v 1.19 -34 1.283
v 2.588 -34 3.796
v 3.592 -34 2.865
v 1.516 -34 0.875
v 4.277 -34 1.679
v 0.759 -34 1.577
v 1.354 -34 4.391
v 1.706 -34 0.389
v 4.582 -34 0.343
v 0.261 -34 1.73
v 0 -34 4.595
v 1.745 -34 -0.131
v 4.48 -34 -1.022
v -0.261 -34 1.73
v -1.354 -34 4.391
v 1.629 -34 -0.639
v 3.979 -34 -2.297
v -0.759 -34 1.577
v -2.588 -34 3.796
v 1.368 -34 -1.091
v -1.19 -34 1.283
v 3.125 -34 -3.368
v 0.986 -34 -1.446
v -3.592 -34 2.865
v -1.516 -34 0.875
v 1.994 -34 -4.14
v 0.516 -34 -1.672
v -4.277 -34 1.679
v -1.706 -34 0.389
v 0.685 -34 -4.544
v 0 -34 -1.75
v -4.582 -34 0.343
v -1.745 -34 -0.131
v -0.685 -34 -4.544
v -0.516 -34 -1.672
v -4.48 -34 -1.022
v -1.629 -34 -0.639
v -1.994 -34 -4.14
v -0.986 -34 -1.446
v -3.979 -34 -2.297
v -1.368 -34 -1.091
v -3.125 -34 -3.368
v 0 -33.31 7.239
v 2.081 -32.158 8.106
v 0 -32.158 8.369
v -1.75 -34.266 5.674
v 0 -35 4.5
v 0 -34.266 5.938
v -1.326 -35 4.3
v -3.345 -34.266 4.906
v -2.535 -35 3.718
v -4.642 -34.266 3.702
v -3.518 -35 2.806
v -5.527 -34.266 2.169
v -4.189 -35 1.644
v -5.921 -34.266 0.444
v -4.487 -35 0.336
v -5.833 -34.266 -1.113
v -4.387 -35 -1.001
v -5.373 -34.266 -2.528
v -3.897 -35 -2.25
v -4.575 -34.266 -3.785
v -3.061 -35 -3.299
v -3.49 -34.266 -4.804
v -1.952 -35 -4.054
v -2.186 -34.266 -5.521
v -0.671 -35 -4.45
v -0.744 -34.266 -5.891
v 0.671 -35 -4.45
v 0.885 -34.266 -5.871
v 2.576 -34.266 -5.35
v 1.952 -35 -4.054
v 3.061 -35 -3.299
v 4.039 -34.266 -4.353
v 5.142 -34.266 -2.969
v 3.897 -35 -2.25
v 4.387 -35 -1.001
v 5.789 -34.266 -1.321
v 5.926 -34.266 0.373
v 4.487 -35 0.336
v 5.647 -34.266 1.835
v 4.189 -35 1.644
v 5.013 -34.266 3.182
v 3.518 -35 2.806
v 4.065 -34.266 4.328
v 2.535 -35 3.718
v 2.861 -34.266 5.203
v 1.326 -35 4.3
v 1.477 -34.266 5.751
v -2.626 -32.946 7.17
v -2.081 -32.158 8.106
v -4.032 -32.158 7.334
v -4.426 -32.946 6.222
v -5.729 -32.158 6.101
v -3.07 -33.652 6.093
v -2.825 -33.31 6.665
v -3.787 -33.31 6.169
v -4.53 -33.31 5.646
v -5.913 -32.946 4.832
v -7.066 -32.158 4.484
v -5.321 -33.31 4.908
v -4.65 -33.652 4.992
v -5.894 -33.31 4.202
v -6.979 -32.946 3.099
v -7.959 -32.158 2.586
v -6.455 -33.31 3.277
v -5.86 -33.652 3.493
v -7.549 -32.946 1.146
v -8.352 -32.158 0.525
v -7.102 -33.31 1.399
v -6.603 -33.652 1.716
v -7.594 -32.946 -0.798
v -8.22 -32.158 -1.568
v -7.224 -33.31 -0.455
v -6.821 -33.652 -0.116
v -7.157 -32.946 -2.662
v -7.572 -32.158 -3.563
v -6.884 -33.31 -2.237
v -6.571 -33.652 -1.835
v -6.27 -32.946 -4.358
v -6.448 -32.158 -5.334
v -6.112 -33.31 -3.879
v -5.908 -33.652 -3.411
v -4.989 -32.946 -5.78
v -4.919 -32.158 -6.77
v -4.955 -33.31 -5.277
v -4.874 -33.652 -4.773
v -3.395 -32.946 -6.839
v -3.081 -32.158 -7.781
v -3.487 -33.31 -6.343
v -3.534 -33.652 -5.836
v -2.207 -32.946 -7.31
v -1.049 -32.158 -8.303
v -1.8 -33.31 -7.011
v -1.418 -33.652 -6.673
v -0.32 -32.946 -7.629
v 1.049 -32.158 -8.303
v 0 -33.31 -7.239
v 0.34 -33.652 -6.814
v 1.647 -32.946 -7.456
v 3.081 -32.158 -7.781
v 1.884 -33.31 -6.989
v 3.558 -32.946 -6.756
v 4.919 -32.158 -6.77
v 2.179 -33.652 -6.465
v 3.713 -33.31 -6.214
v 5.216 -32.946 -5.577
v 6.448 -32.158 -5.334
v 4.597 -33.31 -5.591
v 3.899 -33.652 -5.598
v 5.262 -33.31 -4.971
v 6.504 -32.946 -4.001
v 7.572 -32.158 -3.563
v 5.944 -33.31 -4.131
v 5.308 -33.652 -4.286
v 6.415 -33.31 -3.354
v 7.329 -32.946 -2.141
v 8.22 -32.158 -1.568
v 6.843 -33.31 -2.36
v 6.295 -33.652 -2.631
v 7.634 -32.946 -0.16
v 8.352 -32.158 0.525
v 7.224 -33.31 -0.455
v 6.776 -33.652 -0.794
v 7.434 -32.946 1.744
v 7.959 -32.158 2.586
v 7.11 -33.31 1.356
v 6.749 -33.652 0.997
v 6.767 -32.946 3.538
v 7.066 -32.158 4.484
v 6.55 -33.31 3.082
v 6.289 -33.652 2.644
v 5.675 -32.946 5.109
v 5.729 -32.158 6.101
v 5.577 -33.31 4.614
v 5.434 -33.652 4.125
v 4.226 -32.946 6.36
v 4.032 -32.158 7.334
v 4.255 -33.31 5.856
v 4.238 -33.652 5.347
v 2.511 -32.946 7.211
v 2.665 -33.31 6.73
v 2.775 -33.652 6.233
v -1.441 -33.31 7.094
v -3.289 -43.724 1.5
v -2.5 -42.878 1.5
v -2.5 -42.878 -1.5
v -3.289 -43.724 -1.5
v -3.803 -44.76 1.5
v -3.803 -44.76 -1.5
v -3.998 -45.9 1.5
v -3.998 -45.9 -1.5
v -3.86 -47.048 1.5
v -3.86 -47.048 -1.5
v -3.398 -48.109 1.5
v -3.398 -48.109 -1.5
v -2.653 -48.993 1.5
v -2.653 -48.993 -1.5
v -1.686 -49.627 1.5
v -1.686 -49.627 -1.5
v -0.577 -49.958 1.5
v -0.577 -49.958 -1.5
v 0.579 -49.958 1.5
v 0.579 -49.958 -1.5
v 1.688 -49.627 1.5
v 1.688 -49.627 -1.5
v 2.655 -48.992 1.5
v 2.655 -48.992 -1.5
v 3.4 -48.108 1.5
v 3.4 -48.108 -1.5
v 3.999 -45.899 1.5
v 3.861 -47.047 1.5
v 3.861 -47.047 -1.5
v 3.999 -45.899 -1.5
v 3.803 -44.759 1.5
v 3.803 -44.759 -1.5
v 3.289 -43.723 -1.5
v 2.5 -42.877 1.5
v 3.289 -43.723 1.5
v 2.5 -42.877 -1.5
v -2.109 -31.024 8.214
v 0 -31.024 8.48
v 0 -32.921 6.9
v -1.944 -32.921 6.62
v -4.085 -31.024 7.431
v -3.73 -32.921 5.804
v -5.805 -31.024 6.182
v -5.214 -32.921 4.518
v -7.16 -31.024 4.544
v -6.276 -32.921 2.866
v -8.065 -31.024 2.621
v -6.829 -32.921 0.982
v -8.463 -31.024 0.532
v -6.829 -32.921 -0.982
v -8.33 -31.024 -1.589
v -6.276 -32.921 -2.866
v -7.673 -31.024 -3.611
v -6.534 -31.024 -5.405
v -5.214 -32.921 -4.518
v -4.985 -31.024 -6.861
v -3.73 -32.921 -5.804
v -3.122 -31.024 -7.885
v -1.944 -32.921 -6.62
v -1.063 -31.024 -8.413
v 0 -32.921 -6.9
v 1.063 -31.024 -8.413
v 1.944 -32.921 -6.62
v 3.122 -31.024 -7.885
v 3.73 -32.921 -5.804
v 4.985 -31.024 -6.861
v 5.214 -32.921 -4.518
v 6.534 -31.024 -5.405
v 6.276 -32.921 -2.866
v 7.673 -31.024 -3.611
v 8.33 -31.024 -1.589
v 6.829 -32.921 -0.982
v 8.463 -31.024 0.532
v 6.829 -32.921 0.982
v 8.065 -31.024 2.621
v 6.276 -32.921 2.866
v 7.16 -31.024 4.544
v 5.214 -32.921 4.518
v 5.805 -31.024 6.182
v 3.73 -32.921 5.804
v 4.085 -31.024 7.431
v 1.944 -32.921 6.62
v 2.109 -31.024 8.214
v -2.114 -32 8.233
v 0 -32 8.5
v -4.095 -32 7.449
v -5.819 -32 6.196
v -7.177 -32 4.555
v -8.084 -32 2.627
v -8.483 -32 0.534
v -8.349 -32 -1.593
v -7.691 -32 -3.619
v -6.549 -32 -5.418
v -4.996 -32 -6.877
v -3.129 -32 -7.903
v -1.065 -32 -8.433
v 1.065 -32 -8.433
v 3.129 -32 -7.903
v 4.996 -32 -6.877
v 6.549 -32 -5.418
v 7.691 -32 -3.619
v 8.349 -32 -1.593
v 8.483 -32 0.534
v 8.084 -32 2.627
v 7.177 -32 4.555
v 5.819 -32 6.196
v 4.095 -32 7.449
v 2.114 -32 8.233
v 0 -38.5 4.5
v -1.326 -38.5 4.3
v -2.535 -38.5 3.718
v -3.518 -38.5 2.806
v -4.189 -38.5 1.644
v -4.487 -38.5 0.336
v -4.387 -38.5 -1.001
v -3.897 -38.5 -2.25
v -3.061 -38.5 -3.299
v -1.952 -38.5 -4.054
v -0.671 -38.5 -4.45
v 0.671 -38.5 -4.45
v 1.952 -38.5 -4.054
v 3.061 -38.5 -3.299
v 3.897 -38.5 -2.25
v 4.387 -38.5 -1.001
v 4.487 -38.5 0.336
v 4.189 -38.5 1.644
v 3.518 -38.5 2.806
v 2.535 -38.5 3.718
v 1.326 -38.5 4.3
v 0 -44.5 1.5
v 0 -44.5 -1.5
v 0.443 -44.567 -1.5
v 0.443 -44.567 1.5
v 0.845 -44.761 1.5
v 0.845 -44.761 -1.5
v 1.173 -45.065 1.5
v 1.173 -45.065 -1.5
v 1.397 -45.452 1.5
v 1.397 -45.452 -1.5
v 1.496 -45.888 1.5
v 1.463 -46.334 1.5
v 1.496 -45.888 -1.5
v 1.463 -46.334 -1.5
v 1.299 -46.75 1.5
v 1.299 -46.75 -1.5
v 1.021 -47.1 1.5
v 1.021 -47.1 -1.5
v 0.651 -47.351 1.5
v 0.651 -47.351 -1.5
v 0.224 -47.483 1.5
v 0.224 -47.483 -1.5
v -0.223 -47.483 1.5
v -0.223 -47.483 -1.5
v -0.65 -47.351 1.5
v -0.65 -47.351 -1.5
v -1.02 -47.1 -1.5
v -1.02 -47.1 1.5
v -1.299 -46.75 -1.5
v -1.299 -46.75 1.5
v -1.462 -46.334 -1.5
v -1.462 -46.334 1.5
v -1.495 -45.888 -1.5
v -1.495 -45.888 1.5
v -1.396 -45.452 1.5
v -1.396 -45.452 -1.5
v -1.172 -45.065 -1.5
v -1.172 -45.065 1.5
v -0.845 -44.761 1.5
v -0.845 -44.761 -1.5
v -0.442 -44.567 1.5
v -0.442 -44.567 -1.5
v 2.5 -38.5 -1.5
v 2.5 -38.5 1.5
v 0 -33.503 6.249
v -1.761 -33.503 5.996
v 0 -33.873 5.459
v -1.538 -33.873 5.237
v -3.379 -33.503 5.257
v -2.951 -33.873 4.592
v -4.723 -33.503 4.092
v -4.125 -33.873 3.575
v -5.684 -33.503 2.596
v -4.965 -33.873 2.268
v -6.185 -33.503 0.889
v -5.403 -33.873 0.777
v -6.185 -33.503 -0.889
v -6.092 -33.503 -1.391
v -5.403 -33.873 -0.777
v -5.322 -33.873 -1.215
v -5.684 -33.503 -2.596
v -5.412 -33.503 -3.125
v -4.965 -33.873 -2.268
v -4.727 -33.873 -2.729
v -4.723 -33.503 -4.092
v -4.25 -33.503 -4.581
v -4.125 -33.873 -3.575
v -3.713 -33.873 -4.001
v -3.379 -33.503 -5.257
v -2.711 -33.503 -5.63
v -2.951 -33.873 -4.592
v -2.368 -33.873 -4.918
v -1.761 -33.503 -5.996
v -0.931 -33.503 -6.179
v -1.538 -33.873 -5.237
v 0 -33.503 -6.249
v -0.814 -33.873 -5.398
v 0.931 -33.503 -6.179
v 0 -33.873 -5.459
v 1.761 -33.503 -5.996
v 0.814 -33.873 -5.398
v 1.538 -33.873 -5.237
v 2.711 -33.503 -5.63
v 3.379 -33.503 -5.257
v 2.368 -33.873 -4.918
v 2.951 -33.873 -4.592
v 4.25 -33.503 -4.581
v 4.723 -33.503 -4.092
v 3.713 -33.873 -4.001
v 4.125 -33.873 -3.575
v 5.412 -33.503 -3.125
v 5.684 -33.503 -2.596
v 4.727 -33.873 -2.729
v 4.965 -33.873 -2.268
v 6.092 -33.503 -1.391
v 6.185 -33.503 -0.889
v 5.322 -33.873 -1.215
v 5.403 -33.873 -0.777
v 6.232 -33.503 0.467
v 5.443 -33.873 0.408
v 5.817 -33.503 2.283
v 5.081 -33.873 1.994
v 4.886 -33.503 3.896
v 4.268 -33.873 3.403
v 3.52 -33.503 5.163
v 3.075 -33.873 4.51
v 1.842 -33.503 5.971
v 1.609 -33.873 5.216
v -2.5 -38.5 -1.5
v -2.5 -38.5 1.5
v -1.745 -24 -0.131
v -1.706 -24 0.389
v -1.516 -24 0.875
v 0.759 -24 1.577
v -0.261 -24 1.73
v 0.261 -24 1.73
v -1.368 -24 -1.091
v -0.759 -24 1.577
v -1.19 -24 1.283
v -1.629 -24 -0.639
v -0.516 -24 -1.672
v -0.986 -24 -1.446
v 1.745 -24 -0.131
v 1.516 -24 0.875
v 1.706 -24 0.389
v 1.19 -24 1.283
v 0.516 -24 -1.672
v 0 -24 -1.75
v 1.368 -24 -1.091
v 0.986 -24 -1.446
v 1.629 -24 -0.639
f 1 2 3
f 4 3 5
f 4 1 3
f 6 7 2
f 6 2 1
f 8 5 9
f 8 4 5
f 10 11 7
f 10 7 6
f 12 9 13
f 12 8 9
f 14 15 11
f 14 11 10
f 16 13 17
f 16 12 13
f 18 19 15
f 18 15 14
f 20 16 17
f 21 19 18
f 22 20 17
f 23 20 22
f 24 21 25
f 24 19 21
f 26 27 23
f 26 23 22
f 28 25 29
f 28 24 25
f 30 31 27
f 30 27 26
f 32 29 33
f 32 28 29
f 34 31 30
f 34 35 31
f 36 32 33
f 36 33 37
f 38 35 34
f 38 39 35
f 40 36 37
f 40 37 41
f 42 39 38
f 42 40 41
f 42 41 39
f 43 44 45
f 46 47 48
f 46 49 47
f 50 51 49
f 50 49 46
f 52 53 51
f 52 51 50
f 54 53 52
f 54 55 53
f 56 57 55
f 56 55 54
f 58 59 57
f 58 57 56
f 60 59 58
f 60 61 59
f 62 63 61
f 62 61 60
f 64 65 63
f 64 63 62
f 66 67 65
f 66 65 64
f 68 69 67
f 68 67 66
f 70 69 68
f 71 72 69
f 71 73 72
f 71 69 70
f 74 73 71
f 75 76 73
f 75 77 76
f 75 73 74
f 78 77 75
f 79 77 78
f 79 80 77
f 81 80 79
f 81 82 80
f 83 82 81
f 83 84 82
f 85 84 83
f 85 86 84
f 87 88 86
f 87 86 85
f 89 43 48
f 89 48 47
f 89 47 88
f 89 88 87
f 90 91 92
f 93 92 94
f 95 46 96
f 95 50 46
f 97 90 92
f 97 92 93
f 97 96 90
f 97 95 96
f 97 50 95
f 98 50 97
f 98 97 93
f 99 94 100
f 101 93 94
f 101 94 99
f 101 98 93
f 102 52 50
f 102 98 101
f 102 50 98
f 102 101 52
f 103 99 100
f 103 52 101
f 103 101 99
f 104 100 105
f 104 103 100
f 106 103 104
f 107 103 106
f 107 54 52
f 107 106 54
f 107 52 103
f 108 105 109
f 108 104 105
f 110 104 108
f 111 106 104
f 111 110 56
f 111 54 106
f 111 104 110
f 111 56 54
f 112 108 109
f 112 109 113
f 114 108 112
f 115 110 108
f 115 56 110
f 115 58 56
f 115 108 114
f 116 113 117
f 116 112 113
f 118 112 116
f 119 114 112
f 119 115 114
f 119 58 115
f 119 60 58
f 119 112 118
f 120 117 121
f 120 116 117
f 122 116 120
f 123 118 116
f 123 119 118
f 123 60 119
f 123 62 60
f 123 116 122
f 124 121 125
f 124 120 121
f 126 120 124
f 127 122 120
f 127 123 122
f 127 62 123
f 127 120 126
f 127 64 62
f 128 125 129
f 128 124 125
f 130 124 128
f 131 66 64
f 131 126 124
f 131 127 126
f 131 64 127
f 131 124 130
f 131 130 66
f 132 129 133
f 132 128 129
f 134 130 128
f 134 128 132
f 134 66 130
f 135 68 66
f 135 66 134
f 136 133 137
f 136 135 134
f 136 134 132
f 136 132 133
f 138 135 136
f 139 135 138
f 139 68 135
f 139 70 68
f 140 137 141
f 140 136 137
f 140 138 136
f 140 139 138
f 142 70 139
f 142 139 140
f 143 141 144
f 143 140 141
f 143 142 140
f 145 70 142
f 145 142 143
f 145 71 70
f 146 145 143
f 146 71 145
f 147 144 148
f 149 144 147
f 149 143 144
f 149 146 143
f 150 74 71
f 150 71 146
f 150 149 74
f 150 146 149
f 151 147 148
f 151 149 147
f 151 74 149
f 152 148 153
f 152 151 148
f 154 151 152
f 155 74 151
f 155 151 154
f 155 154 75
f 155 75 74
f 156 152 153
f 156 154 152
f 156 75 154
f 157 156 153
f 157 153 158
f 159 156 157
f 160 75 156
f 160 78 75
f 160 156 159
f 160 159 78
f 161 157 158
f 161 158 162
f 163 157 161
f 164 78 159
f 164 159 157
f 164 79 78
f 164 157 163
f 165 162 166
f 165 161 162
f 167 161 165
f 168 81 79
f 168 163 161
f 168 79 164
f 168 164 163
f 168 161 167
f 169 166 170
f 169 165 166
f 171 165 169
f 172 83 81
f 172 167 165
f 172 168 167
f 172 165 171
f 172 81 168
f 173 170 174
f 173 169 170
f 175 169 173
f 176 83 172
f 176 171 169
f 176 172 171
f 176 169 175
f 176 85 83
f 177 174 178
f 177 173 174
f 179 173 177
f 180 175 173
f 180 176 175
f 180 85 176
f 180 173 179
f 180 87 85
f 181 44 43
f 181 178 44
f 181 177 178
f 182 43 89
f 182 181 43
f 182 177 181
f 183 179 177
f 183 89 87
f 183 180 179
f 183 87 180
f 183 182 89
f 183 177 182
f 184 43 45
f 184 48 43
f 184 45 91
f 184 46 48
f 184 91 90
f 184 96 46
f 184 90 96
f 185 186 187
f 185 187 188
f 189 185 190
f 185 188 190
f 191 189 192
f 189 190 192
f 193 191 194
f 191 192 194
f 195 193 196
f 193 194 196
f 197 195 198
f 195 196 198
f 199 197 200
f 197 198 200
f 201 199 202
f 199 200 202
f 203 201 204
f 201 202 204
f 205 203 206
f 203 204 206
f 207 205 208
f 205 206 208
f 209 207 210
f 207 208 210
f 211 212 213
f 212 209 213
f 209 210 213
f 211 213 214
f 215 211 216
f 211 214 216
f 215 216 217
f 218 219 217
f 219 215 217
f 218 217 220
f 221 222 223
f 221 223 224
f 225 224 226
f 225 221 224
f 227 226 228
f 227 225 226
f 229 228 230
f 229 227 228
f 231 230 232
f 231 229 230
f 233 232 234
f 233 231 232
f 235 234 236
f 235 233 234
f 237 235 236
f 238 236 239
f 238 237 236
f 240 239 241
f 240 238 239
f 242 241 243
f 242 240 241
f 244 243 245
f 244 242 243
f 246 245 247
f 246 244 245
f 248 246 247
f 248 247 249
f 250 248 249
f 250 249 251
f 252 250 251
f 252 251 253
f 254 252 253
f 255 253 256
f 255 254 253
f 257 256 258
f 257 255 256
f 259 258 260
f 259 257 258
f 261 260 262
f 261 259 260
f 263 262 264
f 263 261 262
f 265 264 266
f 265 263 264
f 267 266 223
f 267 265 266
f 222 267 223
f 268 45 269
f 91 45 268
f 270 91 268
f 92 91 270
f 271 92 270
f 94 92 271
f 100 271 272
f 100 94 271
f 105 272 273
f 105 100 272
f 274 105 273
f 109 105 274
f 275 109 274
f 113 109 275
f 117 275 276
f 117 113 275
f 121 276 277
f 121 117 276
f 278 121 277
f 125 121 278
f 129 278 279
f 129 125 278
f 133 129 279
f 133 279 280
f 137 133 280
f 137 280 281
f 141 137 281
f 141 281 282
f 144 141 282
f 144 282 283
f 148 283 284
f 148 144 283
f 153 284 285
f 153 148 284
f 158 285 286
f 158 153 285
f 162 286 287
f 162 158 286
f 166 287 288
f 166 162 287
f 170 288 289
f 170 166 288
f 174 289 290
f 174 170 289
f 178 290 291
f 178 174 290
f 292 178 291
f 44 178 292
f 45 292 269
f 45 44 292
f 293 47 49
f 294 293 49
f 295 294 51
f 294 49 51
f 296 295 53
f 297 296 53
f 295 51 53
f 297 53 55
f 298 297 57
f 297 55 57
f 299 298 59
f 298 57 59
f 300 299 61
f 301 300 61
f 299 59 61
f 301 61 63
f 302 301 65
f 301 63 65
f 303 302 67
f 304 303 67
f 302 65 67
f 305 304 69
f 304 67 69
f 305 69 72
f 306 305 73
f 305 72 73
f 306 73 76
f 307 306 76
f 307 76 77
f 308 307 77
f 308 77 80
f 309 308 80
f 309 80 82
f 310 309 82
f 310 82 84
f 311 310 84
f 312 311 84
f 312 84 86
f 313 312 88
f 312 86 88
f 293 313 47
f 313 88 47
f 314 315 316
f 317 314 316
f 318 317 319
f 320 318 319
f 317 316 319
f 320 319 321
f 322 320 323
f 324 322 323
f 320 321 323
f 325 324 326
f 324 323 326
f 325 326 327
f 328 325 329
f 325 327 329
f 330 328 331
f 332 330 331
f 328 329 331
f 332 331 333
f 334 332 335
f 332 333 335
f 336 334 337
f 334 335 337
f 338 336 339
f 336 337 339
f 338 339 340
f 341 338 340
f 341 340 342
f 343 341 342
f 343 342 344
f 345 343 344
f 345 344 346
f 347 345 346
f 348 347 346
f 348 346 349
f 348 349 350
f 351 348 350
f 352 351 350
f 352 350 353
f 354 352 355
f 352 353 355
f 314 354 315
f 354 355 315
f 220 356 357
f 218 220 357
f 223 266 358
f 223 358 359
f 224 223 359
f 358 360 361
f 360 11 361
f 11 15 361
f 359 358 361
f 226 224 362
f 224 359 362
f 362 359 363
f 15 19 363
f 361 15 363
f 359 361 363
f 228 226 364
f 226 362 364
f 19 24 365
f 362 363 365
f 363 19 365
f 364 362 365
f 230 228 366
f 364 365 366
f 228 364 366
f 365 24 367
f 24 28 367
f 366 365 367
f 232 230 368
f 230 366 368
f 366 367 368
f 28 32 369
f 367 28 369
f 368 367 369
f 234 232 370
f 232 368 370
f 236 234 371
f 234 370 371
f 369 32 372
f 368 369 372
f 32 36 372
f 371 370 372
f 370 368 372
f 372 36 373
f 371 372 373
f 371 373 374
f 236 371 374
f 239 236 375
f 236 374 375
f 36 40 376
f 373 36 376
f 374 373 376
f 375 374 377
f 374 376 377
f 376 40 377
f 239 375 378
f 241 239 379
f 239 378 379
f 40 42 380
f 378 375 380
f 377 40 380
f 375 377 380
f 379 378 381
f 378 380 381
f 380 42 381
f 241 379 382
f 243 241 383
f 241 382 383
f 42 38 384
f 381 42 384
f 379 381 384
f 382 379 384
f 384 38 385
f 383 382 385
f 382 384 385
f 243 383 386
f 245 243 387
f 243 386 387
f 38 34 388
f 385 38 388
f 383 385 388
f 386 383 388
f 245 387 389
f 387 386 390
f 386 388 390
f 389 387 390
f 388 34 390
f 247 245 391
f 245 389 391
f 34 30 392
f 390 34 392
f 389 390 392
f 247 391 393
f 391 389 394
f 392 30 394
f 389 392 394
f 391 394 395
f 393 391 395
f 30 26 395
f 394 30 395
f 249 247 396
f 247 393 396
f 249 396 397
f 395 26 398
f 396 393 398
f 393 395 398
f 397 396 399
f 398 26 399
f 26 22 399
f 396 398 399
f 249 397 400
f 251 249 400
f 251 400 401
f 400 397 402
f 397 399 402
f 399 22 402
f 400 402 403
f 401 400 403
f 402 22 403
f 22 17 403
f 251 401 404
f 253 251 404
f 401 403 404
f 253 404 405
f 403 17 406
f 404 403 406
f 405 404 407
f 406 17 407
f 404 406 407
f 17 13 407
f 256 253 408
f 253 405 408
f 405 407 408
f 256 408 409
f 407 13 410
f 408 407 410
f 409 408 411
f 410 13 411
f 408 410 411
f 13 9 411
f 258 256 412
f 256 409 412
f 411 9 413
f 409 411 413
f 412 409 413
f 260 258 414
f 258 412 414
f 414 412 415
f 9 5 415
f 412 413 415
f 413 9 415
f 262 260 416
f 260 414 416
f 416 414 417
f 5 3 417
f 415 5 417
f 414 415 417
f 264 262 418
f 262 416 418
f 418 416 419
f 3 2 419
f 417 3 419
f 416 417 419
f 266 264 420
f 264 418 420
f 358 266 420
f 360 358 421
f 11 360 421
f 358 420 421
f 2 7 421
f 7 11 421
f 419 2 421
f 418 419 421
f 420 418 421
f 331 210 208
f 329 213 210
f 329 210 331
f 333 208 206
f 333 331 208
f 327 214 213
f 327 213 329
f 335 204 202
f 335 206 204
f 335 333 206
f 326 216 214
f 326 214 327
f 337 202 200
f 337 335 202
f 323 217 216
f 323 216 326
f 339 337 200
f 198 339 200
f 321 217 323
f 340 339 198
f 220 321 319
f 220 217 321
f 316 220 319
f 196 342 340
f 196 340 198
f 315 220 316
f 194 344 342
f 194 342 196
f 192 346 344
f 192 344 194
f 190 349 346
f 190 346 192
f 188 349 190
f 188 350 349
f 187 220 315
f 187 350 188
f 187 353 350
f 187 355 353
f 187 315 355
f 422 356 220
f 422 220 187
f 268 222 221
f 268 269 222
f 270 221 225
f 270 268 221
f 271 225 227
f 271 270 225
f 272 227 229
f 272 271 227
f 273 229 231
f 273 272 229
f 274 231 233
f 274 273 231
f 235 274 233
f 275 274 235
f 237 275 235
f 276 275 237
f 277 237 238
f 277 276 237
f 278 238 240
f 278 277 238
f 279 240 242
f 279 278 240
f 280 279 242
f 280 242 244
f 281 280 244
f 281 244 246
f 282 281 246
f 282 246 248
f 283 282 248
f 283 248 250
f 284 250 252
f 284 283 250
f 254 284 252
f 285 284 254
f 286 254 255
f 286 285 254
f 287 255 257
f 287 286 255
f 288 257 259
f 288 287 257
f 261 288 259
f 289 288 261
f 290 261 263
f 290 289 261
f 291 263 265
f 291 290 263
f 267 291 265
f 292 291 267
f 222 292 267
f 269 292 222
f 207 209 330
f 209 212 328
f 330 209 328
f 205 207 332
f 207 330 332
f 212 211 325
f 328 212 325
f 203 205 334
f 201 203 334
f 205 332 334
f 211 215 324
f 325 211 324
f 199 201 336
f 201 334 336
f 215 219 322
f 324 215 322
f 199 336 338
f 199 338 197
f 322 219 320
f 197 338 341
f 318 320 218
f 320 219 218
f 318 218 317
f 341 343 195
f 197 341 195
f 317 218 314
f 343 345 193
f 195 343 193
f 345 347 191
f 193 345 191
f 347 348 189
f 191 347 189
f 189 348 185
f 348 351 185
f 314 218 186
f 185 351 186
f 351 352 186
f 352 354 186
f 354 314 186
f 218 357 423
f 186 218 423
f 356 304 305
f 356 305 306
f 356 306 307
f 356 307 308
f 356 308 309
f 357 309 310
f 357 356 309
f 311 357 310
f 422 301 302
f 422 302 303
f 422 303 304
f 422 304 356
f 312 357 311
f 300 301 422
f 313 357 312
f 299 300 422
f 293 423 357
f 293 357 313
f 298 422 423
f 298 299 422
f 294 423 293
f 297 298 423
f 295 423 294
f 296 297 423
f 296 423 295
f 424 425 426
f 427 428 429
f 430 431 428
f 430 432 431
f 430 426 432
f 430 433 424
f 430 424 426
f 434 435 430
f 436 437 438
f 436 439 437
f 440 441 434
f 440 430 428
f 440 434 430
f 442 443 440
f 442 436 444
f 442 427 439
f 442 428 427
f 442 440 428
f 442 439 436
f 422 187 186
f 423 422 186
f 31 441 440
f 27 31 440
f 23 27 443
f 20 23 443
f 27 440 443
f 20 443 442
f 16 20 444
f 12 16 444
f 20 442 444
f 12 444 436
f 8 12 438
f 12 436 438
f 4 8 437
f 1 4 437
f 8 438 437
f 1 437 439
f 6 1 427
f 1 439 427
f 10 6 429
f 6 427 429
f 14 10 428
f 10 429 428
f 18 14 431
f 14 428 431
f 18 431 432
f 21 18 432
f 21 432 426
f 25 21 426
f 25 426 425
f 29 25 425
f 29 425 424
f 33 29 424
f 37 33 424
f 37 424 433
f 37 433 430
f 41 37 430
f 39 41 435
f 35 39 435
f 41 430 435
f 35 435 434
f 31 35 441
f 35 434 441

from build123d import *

# Parameters (mm, degrees)
ESBO_O1_R                     = 7.5
RESSALTO_EXTRUS_O1_DEPTH      = 8
ESBO_O2_R                     = 8.5
RESSALTO_EXTRUS_O2_DEPTH      = 3
ESBO_O3_W                     = 8
ESBO_O3_H                     = 3
RESSALTO_EXTRUS_O3_DEPTH      = 10
CORTE_EXTRUS_O1_DEPTH         = 23.27666941
CORTE_EXTRUS_O1_DEPTH_BACK    = 23.27666941
ESBO_O5_R                     = 3
CORTE_EXTRUS_O2_DEPTH         = 3
ESBO_O6_R                     = 5.5
RESSALTO_EXTRUS_O4_DEPTH      = 10
FILETE1_R                     = 1
ESBO_O8_R                     = 1.75
RESSALTO_EXTRUS_O5_DEPTH      = 10
ESBO_O10_R                    = 4.5
RESSALTO_EXTRUS_O6_DEPTH      = 3.5
ESBO_O11_W                    = 5
ESBO_O11_H                    = 3
RESSALTO_EXTRUS_O7_DEPTH      = 5
RESSALTO_EXTRUS_O8_DEPTH      = 1.5
RESSALTO_EXTRUS_O8_DEPTH_BACK = 1.5
ESBO_O13_R                    = 4
ESBO_O14_R                    = 2.5
CORTE_EXTRUS_O3_DEPTH         = 10
FILETE2_R                     = 10
FILETE3_R                     = 3
CUT_EXTRUDE2_START            = -24
CUT_EXTRUDE2_OUTLINE_R        = 8.5
CUT_EXTRUDE2_DEPTH            = 43
SKETCH2_R                     = 2.5
SKETCH2_R_2                   = 1.5
BOSS_EXTRUDE1_DEPTH           = 3


with BuildPart() as part:
    # Esboço1 → Ressalto-extrusão1 (new body)
    with BuildSketch(Plane(origin=(0, 0, 0), x_dir=(1, 0, 0), z_dir=(0, 1, 0))):
        with Locations(Location((0, 0, 0), (0, 0, 270))):
            Circle(ESBO_O1_R)
    extrude(amount=RESSALTO_EXTRUS_O1_DEPTH)

    # Esboço2 → Ressalto-extrusão2 (add)
    with BuildSketch(Plane.XZ):
        with Locations(Location((0, 0, 0), (0, 0, 270))):
            Circle(ESBO_O2_R)
    extrude(amount=RESSALTO_EXTRUS_O2_DEPTH)

    # Esboço3 → Ressalto-extrusão3 (add)
    with BuildSketch(Plane(origin=(0, 8, 0), x_dir=(1, 0, 0), z_dir=(0, 1, 0))):
        Rectangle(ESBO_O3_W, ESBO_O3_H)
    extrude(amount=RESSALTO_EXTRUS_O3_DEPTH)

    # Esboço4 → Corte-extrusão1 (cut, two sides: drawn at the far end of the back side and taken through both)
    with BuildSketch(Plane.XY.offset(1.5).offset(-CORTE_EXTRUS_O1_DEPTH_BACK)):
        with BuildLine():
            Line((-4, 18), (-4, 13.999999871))
            ThreePointArc((-4, 13.999999871), (-2.828427176, 16.828427073), (-1.7e-08, 18))
            Line((-1.7e-08, 18), (-4, 18))
        make_face()
        with BuildLine():
            Line((4, 18), (-1.7e-08, 18))
            ThreePointArc((-1.7e-08, 18), (2.828427119, 16.828427131), (4, 14))
            Line((4, 14), (4, 18))
        make_face()
    extrude(amount=CORTE_EXTRUS_O1_DEPTH + CORTE_EXTRUS_O1_DEPTH_BACK, mode=Mode.SUBTRACT)

    # Esboço5 → Corte-extrusão2 (cut)
    with BuildSketch(Plane.XY.offset(1.5)):
        with Locations((0, 14)):
            Circle(ESBO_O5_R)
    extrude(amount=-CORTE_EXTRUS_O2_DEPTH, mode=Mode.SUBTRACT)

    # Esboço6 → Ressalto-extrusão4 (add)
    with BuildSketch(Plane.XZ.offset(3)):
        with Locations(Location((0, 0, 0), (0, 0, 270))):
            Circle(ESBO_O6_R)
    extrude(amount=RESSALTO_EXTRUS_O4_DEPTH)

    # Loft1: read off the stored shape, not the designer's step
    # Loft1: loft between two sections, ruled curve by curve
    loft1_from = [
        Edge.make_bspline([(1.054348973, -13, 5.397994835), (-9.741640698, -13, 7.506692781), (-11.850338644, -13, -3.28929689), (-1.054348973, -13, -5.397994835), (9.741640698, -13, -7.506692781), (11.850338644, -13, 3.28929689), (1.054348973, -13, 5.397994835)], [0, 0, 0, 0, 0.5, 0.5, 0.5, 1, 1, 1, 1], 3, [1, 0.333333333, 0.333333333, 1, 0.333333333, 0.333333333, 1]),
    ]
    loft1_to = [
        Edge.make_bspline([(-0.660465845, -24, 3.945096307), (-8.550658458, -24, 2.624164617), (-7.229726768, -24, -5.266027996), (0.660465845, -24, -3.945096307), (8.550658458, -24, -2.624164617), (7.229726768, -24, 5.266027996), (-0.660465845, -24, 3.945096307)], [0, 0, 0, 0, 0.5, 0.5, 0.5, 1, 1, 1, 1], 3, [1, 0.333333333, 0.333333333, 1, 0.333333333, 0.333333333, 1]),
    ]
    loft1 = Solid(Shell([*[Face.make_surface_from_curves(loft1_from[k], loft1_to[k]) for k in range(1)], Face(Wire(loft1_from)), Face(Wire(loft1_to))]))
    add(loft1)

    # Filete1
    filete1_edges = [part.edges().sort_by_distance(p)[0] for p in [
        (-5.474439314, -13, 0.529635915),
    ]]
    fillet(filete1_edges, radius=FILETE1_R)

    # Esboço8 → Ressalto-extrusão5 (add)
    with BuildSketch(Plane.XZ.offset(24)):
        with Locations(Location((0, 0, 0), (0, 0, 270))):
            Circle(ESBO_O8_R)
    extrude(amount=RESSALTO_EXTRUS_O5_DEPTH)

    # Esboço9 → Revolução1 (revolve)
    with BuildSketch(Plane(origin=(0, 0, 0), x_dir=(0, 0, -1), z_dir=(1, 0, 0)), mode=Mode.PRIVATE) as revolu_o1_sk:
        Polygon((0, -34), (6, -34), (8.480200039, -31.023759953), (8.5, -32), (6, -35), (0, -35), align=None)
    revolve(revolu_o1_sk.sketch.rotate(Axis((0, 0, 0), (0, -1, 0)), 180), axis=Axis((0, 0, 0), (0, -1, 0)))

    # Esboço10 → Ressalto-extrusão6 (add)
    with BuildSketch(Plane.XZ.offset(35)):
        with Locations(Location((0, 0, 0), (0, 0, 90))):
            Circle(ESBO_O10_R)
    extrude(amount=RESSALTO_EXTRUS_O6_DEPTH)

    # Esboço11 → Ressalto-extrusão7 (add)
    with BuildSketch(Plane.XZ.offset(38.5)):
        Rectangle(ESBO_O11_W, ESBO_O11_H)
    extrude(amount=RESSALTO_EXTRUS_O7_DEPTH)

    # Esboço13 → Ressalto-extrusão8 (add, two sides: drawn at the far end of the back side and taken through both)
    with BuildSketch(Plane.XY.offset(-RESSALTO_EXTRUS_O8_DEPTH_BACK)):
        with Locations((0.000453955, -45.999999998)):
            Circle(ESBO_O13_R)
    extrude(amount=RESSALTO_EXTRUS_O8_DEPTH + RESSALTO_EXTRUS_O8_DEPTH_BACK)

    # Esboço14 → Corte-extrusão3 (cut)
    with BuildSketch(Plane(origin=(0, 0, -1.5), x_dir=(-1, 0, 0), z_dir=(0, 0, -1))):
        with Locations((-0.000453955, -45.999999998)):
            Circle(ESBO_O14_R)
    extrude(amount=-CORTE_EXTRUS_O3_DEPTH, mode=Mode.SUBTRACT)

    # Filete2
    # the kernel refuses this fillet: 10 mm, written as the material it takes off along each edge
    with BuildSketch(Plane(origin=(0, -35, 0), x_dir=(0, 0, 1), z_dir=(1, 0, 0))) as filete2_piece_1:
        with BuildLine():
            CenterArc((0.686510113, -9.244311488), FILETE2_R, 39.805571092, 27.777161729)
            Line((4.5, 0), (6, 0))
            Line((6, 0), (8.368722909, -2.842467491))
        make_face()
    revolve(axis=Axis((0, -35, 0), (0, -1, 0)), mode=Mode.SUBTRACT)

    # Filete3
    filete3_edges = [part.edges().sort_by_distance(p)[0] for p in [
        (0, -34, -6),
    ]]
    fillet(filete3_edges, radius=FILETE3_R)

    # Cut-Extrude2: read off the stored shape, not the designer's step
    # Cut-Extrude2 outline → Cut-Extrude2 (cut)
    with BuildSketch(Plane(origin=(0, 0, 0), x_dir=(1, 0, 0), z_dir=(0, 1, 0)).offset(CUT_EXTRUDE2_START)):
        Circle(CUT_EXTRUDE2_OUTLINE_R)
    extrude(amount=CUT_EXTRUDE2_DEPTH, mode=Mode.SUBTRACT)

    # Sketch2 → Boss-Extrude1 (add)
    with BuildSketch(Plane(origin=(0, 0, -1.5), x_dir=(-1, 0, 0), z_dir=(0, 0, -1))):
        with Locations((-0.000453955, -45.999999998)):
            Circle(SKETCH2_R)
        with Locations(Location((-0.000453955, -45.999999998, 0), (0, 0, 90))):
            Circle(SKETCH2_R_2, mode=Mode.SUBTRACT)
    extrude(amount=-BOSS_EXTRUDE1_DEPTH)


solid = part.part
